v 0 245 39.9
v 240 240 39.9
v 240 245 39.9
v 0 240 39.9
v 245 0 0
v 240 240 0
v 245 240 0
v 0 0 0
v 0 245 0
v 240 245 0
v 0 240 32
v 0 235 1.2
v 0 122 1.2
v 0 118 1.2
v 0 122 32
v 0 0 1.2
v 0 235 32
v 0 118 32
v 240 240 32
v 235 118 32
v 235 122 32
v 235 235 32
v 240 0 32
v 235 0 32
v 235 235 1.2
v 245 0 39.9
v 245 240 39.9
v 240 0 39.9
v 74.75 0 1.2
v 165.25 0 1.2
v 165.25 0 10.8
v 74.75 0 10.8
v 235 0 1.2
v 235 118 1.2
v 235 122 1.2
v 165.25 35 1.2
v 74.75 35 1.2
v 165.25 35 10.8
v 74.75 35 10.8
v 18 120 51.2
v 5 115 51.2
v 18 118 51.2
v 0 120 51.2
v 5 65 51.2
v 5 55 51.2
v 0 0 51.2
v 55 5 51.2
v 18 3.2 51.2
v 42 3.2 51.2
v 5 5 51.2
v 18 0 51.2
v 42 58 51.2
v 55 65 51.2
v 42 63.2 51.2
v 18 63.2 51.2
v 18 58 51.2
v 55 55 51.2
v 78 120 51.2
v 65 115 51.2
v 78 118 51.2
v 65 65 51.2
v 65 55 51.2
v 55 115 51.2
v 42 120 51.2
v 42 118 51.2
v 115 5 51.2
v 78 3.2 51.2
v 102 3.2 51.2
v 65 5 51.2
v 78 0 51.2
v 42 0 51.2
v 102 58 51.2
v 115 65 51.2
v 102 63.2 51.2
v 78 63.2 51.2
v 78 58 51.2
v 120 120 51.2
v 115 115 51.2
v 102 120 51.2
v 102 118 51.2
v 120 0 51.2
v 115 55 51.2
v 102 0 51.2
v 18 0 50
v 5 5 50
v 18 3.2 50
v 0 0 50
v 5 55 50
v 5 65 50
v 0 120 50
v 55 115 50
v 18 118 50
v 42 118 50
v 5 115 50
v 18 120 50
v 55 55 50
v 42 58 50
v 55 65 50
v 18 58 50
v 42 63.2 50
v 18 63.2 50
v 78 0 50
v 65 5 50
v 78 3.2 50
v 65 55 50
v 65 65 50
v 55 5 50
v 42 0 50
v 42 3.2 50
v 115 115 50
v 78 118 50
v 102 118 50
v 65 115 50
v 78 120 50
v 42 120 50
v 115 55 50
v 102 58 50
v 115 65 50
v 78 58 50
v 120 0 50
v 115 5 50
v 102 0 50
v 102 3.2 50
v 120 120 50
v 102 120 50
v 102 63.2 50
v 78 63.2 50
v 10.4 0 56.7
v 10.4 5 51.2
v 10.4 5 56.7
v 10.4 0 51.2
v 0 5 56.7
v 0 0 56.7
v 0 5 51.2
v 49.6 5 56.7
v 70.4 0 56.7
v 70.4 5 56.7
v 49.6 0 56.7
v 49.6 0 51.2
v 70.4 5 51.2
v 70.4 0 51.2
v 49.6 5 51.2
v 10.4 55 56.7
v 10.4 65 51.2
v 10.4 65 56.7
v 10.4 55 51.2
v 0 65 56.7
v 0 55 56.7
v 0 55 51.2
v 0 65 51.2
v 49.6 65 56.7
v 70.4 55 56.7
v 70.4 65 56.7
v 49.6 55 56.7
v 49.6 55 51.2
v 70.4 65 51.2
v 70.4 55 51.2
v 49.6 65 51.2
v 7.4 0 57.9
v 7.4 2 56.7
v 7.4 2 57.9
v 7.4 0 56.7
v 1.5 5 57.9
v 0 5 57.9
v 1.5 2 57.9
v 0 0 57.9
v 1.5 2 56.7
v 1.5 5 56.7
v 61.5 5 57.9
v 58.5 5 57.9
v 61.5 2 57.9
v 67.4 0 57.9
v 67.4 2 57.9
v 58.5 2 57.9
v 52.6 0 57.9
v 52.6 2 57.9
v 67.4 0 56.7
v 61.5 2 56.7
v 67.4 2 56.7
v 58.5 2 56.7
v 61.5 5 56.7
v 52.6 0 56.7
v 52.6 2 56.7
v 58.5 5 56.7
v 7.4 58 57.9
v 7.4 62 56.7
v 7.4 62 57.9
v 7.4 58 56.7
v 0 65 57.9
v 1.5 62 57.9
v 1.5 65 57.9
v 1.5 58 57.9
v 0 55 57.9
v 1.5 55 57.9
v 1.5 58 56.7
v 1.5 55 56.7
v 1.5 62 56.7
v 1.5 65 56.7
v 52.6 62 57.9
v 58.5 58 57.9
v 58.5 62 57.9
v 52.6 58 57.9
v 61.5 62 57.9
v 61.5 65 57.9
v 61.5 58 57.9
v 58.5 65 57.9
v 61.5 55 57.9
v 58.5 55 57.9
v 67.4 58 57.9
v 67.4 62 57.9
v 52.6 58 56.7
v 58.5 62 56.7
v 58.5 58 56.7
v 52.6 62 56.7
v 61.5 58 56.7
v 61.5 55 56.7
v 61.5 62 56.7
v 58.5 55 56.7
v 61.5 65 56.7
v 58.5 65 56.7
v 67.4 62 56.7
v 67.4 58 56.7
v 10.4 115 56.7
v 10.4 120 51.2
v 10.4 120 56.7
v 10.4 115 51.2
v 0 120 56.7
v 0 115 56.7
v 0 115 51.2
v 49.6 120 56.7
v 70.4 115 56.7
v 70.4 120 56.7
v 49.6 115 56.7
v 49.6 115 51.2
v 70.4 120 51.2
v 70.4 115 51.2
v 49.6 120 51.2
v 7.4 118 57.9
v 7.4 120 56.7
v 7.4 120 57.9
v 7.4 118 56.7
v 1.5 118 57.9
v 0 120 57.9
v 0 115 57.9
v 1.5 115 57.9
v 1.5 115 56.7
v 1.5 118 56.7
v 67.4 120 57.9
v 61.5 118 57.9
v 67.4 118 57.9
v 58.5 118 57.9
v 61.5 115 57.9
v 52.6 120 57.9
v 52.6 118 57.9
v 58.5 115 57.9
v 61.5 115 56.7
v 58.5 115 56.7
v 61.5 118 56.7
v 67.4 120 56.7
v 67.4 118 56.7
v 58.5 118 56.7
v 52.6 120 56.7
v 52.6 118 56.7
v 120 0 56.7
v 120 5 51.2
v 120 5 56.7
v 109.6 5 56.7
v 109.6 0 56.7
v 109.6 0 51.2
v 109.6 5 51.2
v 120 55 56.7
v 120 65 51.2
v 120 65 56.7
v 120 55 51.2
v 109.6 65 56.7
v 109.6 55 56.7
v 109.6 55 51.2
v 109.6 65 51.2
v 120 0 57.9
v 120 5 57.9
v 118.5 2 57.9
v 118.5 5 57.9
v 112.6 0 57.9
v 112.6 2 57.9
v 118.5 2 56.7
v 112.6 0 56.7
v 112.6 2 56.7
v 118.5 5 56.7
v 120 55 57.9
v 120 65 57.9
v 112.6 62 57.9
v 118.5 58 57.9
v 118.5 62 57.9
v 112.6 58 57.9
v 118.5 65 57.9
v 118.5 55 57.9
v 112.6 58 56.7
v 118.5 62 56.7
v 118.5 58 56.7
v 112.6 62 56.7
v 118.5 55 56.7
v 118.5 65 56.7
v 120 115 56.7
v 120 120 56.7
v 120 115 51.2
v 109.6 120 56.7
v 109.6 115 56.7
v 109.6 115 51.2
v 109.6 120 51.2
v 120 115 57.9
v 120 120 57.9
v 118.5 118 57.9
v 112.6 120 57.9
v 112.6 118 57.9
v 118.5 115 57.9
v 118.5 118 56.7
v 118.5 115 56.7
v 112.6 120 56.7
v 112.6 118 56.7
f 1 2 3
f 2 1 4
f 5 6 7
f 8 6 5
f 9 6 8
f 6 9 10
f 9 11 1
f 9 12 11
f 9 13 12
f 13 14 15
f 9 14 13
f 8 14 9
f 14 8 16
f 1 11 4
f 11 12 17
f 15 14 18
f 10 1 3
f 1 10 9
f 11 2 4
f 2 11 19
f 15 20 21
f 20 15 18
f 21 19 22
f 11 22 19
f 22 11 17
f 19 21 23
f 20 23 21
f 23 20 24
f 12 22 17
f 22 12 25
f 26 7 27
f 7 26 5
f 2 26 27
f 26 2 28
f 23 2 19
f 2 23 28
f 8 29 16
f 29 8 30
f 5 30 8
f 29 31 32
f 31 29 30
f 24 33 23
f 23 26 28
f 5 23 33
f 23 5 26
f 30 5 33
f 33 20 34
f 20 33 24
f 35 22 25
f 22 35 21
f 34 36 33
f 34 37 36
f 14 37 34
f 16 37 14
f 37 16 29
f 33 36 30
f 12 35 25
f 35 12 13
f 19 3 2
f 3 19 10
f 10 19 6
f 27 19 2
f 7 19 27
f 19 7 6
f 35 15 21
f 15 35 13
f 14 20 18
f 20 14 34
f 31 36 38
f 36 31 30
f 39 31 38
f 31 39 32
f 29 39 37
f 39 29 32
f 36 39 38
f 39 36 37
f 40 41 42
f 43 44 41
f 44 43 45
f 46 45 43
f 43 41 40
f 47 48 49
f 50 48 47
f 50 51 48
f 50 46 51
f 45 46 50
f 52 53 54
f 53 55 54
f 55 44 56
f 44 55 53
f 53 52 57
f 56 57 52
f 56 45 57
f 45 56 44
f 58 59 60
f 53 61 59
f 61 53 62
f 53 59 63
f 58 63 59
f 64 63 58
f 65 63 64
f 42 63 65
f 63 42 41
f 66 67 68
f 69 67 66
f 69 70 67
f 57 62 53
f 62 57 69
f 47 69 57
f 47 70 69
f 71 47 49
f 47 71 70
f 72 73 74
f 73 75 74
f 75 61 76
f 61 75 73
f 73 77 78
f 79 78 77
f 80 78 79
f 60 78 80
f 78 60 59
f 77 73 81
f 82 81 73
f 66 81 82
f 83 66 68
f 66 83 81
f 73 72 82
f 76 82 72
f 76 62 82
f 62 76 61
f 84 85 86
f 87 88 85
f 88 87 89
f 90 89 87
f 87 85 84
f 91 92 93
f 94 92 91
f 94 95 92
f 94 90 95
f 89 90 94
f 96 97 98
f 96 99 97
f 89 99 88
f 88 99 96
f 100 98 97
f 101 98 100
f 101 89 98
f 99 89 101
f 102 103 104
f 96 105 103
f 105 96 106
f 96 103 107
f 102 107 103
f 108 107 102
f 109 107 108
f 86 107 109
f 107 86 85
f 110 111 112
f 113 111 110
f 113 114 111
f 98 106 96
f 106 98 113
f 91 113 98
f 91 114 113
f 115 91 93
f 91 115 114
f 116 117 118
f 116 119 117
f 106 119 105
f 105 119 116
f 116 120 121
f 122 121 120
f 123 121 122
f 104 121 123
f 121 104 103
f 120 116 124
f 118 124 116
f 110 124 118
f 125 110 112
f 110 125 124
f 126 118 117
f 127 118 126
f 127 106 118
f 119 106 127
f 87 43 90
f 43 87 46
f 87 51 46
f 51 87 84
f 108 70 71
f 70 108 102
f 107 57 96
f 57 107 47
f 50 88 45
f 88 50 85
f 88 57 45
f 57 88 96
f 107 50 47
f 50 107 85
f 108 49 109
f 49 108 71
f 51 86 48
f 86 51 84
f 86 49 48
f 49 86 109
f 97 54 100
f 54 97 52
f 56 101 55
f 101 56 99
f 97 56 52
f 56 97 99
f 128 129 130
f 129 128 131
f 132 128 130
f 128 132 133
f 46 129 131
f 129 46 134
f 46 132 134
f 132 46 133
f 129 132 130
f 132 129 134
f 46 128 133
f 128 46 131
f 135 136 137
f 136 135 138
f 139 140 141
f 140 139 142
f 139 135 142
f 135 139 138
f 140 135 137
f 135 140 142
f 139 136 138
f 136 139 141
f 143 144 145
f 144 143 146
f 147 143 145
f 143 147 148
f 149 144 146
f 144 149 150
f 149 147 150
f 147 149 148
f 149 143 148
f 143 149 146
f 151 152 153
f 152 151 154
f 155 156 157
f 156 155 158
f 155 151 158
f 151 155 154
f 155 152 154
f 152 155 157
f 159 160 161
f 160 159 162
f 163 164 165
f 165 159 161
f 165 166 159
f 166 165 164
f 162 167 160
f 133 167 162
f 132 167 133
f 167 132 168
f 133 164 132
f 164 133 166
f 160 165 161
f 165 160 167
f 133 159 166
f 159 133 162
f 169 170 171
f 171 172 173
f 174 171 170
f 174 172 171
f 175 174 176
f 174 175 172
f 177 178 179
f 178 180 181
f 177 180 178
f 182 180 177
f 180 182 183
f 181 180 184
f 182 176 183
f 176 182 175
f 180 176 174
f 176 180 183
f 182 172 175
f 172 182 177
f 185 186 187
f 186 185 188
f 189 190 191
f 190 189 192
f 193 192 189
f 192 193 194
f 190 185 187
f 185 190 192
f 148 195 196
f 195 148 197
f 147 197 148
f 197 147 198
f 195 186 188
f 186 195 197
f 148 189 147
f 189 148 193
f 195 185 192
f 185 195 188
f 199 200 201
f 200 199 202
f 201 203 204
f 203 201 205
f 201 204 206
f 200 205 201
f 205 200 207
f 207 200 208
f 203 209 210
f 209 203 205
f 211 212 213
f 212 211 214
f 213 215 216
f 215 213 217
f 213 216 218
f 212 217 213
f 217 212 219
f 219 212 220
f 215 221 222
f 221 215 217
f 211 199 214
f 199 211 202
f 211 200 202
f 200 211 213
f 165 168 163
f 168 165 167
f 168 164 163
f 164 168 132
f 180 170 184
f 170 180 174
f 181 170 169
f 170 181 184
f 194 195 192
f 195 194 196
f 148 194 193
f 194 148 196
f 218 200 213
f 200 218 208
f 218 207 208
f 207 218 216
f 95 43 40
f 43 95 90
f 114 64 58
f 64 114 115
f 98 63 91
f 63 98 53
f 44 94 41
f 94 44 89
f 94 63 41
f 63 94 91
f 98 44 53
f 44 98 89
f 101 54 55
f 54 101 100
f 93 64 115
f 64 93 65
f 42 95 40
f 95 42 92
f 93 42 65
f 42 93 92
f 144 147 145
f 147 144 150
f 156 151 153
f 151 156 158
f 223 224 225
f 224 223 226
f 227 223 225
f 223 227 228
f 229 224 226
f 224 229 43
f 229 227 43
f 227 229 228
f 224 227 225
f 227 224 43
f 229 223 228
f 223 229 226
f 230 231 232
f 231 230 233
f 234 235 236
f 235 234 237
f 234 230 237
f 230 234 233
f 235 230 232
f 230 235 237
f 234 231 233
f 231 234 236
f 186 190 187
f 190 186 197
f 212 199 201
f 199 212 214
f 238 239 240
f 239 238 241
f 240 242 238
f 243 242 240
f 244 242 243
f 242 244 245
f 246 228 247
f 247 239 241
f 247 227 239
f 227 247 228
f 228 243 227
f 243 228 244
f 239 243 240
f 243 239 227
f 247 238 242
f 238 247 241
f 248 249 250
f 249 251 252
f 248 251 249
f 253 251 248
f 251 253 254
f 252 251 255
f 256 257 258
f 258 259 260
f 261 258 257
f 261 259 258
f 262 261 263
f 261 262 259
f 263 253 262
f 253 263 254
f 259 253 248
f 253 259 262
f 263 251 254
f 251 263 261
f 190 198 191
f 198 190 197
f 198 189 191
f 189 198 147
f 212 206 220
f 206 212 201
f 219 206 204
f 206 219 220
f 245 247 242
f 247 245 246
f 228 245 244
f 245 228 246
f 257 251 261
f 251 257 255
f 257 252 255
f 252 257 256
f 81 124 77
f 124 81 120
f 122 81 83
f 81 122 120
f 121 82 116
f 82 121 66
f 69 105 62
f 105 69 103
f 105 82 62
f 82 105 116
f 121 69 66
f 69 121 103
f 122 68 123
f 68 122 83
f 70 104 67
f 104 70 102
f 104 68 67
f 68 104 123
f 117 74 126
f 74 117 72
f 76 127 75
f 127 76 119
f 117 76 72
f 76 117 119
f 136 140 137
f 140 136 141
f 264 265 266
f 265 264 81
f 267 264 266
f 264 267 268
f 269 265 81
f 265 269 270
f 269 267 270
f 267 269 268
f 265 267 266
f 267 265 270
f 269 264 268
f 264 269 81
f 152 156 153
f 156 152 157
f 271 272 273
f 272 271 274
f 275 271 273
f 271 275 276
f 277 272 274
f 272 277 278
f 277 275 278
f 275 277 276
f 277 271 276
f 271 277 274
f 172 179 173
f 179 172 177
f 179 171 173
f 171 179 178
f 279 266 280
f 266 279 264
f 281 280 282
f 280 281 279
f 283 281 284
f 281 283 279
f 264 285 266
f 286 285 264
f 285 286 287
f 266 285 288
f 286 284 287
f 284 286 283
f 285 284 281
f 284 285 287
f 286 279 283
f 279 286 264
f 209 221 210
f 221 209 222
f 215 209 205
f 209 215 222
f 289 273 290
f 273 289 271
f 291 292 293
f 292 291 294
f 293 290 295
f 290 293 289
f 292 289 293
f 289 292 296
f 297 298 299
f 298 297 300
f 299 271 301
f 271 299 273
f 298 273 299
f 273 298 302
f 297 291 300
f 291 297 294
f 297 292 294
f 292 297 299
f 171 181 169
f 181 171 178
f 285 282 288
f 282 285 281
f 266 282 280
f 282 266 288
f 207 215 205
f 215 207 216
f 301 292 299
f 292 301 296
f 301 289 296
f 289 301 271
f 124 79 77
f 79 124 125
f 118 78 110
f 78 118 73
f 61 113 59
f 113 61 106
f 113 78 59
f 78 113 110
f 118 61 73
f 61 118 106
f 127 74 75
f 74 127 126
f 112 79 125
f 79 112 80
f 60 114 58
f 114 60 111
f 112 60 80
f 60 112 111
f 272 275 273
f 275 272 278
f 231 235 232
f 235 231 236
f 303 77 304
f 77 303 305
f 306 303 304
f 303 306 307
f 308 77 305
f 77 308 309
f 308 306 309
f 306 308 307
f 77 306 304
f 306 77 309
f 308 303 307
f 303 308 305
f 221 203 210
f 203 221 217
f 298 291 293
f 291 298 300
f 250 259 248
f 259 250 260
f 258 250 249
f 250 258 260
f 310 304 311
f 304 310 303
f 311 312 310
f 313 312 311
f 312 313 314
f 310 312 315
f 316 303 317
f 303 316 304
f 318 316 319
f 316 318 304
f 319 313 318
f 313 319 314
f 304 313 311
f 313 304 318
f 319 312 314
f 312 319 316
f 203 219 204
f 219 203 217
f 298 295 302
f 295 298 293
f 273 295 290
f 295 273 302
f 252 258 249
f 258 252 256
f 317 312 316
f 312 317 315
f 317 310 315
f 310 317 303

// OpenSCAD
module case_base(){
    module plate()
    {
        difference() {
            cube([field_size, field_size, plate_height]);
            translate([5,5,0]){
                cube([field_size - 10, field_size - 10, plate_height]);
                
            }

            pin_spareout_x_length = 8 * 2.5 + 4;
            translate([(field_size - pin_spareout_x_length)/2, 0, 0]){
                cube([pin_spareout_x_length, 3.2, plate_height]);
            }
            translate([(field_size - pin_spareout_x_length)/2, field_size - 2, 0]){
                cube([pin_spareout_x_length, 2, plate_height]);
            }
        }
    }

    module stage()
    {
        block_x_length = (field_size - rc522_width) / 2;

        cube([block_x_length, 5, rc522_height]);
        translate([field_size - block_x_length, 0, 0]) {
            cube([block_x_length, 5, rc522_height]);
        }
        translate([0,field_size - 5, 0]) {
            cube([block_x_length, 5, rc522_height]);
        }
        translate([field_size - block_x_length,field_size - 5, 0]) {
            cube([block_x_length, 5, rc522_height]);
        }
    }



    plate();
    translate([0,0,plate_height]){
        stage();
    }
    translate([0,0,plate_height + rc522_height]) {
        connector();
    }
}


module connector()
{
    height = plate_height;


    block_x_length = (field_size - rc522_width) / 2 - 3;
    block_y_length = 2;

    cube([block_x_length, block_y_length, height]);
    translate([field_size - block_x_length, 0, 0]) {
        cube([block_x_length, block_y_length, height]);
    }
    translate([0,field_size - block_y_length, 0]) {
        cube([block_x_length, block_y_length, height]);
    }
    translate([field_size - block_x_length,field_size - block_y_length, 0]) {
        cube([block_x_length, block_y_length, height]);
    }


//
    cube([1.5, 5, height]);
    
    translate([field_size - 1.5,0,0]) {
        cube([1.5, 5, height]);
    }
    translate([0,field_size - 5,0]) {
        cube([1.5, 5, height]);
    }
    translate([field_size - 1.5,field_size - 5,0]) {
        cube([1.5, 5, height]);
    }

}

module top_base()
{
    module real_field_outline()
    {
        translate([0,10,0])
        {
            difference(){
                cube([field_size, field_size, 0.4]);

                translate([0.2, 0.2, 0]){
                    cube([field_size -0.4, field_size -0.4, 0.4]);
                }

                translate([0.4, 0, 0]){
                    cube([field_size -0.8, field_size, 0.4]);
                }
                translate([0, 0.4, 0]){
                    cube([field_size, field_size -0.8, 0.4]);
                }

            }
        }
    }

    module case()
    {
        read_width = rc522_width - 4;
        read_length = 42 - 4;
        read_offset_y = field_size - 42 + 2;
        difference() {
            cube([field_size, field_size, plate_height]);

            connector();

            translate([(field_size - read_width) / 2, read_offset_y, 0]){
                cube([read_width, read_length, plate_height]);
            }


            s1w = field_size - 10;
            s1l = field_size - 42 - 5;
            translate([(field_size - s1w) / 2, 5, 0]){
                cube([s1w, s1l, plate_height]);
            }


            s2w = (field_size - rc522_width) / 2 - 5;
            s2l = 42 - 10;
            s2oy = field_size - 42 + 5;

            translate([5, s2oy, 0]){
                cube([s2w, s2l, plate_height]);
            }

            s3w = (field_size - rc522_width) / 2 - 5;
            s3l = 42 - 10;
            s3oy = field_size - 42 + 5;

            translate([field_size - s3w - 5, s3oy, 0]){
                cube([s3w, s3l, plate_height]);
            }
        }

        difference(){
            translate([(field_size - read_width - 4) / 2, read_offset_y-2, plate_height]){
                cube([read_width + 4, read_length + 4, 3]);
            }
            translate([(field_size - read_width) / 2, read_offset_y, plate_height]){
                cube([read_width, read_length, 3]);
            }
        }
    }


    translate([0,0,plate_height]){
        real_field_outline();
    }
    case();
}

module case(size)
{
    for(x = [0:size - 1]) {
        for(y = [0:size - 1]) {
            translate([
                x*field_size,
                y*field_size,
                0
            ]) {
                case_base();
            }
        }
    }
}


module top(size)
{
    for(x = [0:size - 1]) {
        for(y = [0:size - 1]) {
            translate([
                x*field_size,
                y*field_size,
                0
            ]) {
                    top_base();
                
            }
        }
    }
}

module ground_plate()
{

    pcb_z = 6;
    wall_height = 2 * pcb_z + 20;


    cube([field_size, field_size, plate_height ]);

}

module ground_border_bottom(size)
{
    translate([0, -5, 0]){
        cube([field_size, 5, 32 + plate_height + rc522_height + plate_height]);
    }
    difference(){
        cube([field_size, 5, 32]);
        
        pin_spareout_x_length = 8 * 2.5 + 4;

        translate([(field_size - pin_spareout_x_length) / 2, 0, 0]) {
            cube([pin_spareout_x_length, 10, 32]);
        }
    }
}
module ground_border_top(size)
{
    cube([field_size, 5, 32 + plate_height + rc522_height + plate_height]);
    translate([0, -5, 0]){
        cube([field_size, 5, 32]);

    }
    translate([0, -1 * field_size * size, 0]){
        //cube([field_size, 2, 32]);
    }
}
module ground_border_left(size)
{
    translate([-5, 0, 0]){
        cube([5, field_size, 32 + plate_height + rc522_height + plate_height]);
    }
    //cube([5, field_size, 32]);

}
module ground_border_right(size)
{
    cube([5, field_size, 32 + plate_height + rc522_height + plate_height]);
    translate([-5, 0, 0]){
        cube([5, field_size, 32]);    
    }

    translate([-1 * field_size * size, 0, 0]){
        //cube([2, field_size, 32]);
    }
}

 
module ground(size)
{
    size = 4;
    module pcb()
    {
        translate([(field_size * size - expander_length) / 2 ,0, 0 ]) {
            cube([expander_length, expander_width / 2, plate_height + 6 + pcb_thickness + 2.4]);
        }
    }

    translate([0, field_size * size / 2 - 2, 0])
        cube([field_size * size, 4, 32]);
    //cube([2, field_size * size, 32]);
    //cube([5, field_size, 32]);
    
    for(x = [0:size - 1]) {
        //translate([x * field_size, 0, 0])                 ground_border_bottom(size);
        translate([x * field_size, field_size * size, 0]) ground_border_top(size);
        //translate([0, x*field_size, 0])                   ground_border_left(size);
        translate([field_size * size, x * field_size, 0]) ground_border_right(size);
        
        for(y = [0:size - 1]) {
            translate([x * field_size, y * field_size, 0 ]) ground_plate();
        }        
    }

    pcb();


}





board_size = 2;
field_size=60;
rc522_width=39.2;
rc522_height=5.5;
plate_height=1.2;

expander_width = 70;
expander_length = 90.5;
expander_srew_holes_d = 3.5;

pcb_thickness = 1.2;

translate([0, 0, 0]) {
    //translate([0, -1 * (board_size * field_size + 10), 0]){
    ground(board_size);
}


translate([0, 0, 50]) {
    case(board_size);
}

translate([0, 0, 100]) {
//    top(board_size);
}
